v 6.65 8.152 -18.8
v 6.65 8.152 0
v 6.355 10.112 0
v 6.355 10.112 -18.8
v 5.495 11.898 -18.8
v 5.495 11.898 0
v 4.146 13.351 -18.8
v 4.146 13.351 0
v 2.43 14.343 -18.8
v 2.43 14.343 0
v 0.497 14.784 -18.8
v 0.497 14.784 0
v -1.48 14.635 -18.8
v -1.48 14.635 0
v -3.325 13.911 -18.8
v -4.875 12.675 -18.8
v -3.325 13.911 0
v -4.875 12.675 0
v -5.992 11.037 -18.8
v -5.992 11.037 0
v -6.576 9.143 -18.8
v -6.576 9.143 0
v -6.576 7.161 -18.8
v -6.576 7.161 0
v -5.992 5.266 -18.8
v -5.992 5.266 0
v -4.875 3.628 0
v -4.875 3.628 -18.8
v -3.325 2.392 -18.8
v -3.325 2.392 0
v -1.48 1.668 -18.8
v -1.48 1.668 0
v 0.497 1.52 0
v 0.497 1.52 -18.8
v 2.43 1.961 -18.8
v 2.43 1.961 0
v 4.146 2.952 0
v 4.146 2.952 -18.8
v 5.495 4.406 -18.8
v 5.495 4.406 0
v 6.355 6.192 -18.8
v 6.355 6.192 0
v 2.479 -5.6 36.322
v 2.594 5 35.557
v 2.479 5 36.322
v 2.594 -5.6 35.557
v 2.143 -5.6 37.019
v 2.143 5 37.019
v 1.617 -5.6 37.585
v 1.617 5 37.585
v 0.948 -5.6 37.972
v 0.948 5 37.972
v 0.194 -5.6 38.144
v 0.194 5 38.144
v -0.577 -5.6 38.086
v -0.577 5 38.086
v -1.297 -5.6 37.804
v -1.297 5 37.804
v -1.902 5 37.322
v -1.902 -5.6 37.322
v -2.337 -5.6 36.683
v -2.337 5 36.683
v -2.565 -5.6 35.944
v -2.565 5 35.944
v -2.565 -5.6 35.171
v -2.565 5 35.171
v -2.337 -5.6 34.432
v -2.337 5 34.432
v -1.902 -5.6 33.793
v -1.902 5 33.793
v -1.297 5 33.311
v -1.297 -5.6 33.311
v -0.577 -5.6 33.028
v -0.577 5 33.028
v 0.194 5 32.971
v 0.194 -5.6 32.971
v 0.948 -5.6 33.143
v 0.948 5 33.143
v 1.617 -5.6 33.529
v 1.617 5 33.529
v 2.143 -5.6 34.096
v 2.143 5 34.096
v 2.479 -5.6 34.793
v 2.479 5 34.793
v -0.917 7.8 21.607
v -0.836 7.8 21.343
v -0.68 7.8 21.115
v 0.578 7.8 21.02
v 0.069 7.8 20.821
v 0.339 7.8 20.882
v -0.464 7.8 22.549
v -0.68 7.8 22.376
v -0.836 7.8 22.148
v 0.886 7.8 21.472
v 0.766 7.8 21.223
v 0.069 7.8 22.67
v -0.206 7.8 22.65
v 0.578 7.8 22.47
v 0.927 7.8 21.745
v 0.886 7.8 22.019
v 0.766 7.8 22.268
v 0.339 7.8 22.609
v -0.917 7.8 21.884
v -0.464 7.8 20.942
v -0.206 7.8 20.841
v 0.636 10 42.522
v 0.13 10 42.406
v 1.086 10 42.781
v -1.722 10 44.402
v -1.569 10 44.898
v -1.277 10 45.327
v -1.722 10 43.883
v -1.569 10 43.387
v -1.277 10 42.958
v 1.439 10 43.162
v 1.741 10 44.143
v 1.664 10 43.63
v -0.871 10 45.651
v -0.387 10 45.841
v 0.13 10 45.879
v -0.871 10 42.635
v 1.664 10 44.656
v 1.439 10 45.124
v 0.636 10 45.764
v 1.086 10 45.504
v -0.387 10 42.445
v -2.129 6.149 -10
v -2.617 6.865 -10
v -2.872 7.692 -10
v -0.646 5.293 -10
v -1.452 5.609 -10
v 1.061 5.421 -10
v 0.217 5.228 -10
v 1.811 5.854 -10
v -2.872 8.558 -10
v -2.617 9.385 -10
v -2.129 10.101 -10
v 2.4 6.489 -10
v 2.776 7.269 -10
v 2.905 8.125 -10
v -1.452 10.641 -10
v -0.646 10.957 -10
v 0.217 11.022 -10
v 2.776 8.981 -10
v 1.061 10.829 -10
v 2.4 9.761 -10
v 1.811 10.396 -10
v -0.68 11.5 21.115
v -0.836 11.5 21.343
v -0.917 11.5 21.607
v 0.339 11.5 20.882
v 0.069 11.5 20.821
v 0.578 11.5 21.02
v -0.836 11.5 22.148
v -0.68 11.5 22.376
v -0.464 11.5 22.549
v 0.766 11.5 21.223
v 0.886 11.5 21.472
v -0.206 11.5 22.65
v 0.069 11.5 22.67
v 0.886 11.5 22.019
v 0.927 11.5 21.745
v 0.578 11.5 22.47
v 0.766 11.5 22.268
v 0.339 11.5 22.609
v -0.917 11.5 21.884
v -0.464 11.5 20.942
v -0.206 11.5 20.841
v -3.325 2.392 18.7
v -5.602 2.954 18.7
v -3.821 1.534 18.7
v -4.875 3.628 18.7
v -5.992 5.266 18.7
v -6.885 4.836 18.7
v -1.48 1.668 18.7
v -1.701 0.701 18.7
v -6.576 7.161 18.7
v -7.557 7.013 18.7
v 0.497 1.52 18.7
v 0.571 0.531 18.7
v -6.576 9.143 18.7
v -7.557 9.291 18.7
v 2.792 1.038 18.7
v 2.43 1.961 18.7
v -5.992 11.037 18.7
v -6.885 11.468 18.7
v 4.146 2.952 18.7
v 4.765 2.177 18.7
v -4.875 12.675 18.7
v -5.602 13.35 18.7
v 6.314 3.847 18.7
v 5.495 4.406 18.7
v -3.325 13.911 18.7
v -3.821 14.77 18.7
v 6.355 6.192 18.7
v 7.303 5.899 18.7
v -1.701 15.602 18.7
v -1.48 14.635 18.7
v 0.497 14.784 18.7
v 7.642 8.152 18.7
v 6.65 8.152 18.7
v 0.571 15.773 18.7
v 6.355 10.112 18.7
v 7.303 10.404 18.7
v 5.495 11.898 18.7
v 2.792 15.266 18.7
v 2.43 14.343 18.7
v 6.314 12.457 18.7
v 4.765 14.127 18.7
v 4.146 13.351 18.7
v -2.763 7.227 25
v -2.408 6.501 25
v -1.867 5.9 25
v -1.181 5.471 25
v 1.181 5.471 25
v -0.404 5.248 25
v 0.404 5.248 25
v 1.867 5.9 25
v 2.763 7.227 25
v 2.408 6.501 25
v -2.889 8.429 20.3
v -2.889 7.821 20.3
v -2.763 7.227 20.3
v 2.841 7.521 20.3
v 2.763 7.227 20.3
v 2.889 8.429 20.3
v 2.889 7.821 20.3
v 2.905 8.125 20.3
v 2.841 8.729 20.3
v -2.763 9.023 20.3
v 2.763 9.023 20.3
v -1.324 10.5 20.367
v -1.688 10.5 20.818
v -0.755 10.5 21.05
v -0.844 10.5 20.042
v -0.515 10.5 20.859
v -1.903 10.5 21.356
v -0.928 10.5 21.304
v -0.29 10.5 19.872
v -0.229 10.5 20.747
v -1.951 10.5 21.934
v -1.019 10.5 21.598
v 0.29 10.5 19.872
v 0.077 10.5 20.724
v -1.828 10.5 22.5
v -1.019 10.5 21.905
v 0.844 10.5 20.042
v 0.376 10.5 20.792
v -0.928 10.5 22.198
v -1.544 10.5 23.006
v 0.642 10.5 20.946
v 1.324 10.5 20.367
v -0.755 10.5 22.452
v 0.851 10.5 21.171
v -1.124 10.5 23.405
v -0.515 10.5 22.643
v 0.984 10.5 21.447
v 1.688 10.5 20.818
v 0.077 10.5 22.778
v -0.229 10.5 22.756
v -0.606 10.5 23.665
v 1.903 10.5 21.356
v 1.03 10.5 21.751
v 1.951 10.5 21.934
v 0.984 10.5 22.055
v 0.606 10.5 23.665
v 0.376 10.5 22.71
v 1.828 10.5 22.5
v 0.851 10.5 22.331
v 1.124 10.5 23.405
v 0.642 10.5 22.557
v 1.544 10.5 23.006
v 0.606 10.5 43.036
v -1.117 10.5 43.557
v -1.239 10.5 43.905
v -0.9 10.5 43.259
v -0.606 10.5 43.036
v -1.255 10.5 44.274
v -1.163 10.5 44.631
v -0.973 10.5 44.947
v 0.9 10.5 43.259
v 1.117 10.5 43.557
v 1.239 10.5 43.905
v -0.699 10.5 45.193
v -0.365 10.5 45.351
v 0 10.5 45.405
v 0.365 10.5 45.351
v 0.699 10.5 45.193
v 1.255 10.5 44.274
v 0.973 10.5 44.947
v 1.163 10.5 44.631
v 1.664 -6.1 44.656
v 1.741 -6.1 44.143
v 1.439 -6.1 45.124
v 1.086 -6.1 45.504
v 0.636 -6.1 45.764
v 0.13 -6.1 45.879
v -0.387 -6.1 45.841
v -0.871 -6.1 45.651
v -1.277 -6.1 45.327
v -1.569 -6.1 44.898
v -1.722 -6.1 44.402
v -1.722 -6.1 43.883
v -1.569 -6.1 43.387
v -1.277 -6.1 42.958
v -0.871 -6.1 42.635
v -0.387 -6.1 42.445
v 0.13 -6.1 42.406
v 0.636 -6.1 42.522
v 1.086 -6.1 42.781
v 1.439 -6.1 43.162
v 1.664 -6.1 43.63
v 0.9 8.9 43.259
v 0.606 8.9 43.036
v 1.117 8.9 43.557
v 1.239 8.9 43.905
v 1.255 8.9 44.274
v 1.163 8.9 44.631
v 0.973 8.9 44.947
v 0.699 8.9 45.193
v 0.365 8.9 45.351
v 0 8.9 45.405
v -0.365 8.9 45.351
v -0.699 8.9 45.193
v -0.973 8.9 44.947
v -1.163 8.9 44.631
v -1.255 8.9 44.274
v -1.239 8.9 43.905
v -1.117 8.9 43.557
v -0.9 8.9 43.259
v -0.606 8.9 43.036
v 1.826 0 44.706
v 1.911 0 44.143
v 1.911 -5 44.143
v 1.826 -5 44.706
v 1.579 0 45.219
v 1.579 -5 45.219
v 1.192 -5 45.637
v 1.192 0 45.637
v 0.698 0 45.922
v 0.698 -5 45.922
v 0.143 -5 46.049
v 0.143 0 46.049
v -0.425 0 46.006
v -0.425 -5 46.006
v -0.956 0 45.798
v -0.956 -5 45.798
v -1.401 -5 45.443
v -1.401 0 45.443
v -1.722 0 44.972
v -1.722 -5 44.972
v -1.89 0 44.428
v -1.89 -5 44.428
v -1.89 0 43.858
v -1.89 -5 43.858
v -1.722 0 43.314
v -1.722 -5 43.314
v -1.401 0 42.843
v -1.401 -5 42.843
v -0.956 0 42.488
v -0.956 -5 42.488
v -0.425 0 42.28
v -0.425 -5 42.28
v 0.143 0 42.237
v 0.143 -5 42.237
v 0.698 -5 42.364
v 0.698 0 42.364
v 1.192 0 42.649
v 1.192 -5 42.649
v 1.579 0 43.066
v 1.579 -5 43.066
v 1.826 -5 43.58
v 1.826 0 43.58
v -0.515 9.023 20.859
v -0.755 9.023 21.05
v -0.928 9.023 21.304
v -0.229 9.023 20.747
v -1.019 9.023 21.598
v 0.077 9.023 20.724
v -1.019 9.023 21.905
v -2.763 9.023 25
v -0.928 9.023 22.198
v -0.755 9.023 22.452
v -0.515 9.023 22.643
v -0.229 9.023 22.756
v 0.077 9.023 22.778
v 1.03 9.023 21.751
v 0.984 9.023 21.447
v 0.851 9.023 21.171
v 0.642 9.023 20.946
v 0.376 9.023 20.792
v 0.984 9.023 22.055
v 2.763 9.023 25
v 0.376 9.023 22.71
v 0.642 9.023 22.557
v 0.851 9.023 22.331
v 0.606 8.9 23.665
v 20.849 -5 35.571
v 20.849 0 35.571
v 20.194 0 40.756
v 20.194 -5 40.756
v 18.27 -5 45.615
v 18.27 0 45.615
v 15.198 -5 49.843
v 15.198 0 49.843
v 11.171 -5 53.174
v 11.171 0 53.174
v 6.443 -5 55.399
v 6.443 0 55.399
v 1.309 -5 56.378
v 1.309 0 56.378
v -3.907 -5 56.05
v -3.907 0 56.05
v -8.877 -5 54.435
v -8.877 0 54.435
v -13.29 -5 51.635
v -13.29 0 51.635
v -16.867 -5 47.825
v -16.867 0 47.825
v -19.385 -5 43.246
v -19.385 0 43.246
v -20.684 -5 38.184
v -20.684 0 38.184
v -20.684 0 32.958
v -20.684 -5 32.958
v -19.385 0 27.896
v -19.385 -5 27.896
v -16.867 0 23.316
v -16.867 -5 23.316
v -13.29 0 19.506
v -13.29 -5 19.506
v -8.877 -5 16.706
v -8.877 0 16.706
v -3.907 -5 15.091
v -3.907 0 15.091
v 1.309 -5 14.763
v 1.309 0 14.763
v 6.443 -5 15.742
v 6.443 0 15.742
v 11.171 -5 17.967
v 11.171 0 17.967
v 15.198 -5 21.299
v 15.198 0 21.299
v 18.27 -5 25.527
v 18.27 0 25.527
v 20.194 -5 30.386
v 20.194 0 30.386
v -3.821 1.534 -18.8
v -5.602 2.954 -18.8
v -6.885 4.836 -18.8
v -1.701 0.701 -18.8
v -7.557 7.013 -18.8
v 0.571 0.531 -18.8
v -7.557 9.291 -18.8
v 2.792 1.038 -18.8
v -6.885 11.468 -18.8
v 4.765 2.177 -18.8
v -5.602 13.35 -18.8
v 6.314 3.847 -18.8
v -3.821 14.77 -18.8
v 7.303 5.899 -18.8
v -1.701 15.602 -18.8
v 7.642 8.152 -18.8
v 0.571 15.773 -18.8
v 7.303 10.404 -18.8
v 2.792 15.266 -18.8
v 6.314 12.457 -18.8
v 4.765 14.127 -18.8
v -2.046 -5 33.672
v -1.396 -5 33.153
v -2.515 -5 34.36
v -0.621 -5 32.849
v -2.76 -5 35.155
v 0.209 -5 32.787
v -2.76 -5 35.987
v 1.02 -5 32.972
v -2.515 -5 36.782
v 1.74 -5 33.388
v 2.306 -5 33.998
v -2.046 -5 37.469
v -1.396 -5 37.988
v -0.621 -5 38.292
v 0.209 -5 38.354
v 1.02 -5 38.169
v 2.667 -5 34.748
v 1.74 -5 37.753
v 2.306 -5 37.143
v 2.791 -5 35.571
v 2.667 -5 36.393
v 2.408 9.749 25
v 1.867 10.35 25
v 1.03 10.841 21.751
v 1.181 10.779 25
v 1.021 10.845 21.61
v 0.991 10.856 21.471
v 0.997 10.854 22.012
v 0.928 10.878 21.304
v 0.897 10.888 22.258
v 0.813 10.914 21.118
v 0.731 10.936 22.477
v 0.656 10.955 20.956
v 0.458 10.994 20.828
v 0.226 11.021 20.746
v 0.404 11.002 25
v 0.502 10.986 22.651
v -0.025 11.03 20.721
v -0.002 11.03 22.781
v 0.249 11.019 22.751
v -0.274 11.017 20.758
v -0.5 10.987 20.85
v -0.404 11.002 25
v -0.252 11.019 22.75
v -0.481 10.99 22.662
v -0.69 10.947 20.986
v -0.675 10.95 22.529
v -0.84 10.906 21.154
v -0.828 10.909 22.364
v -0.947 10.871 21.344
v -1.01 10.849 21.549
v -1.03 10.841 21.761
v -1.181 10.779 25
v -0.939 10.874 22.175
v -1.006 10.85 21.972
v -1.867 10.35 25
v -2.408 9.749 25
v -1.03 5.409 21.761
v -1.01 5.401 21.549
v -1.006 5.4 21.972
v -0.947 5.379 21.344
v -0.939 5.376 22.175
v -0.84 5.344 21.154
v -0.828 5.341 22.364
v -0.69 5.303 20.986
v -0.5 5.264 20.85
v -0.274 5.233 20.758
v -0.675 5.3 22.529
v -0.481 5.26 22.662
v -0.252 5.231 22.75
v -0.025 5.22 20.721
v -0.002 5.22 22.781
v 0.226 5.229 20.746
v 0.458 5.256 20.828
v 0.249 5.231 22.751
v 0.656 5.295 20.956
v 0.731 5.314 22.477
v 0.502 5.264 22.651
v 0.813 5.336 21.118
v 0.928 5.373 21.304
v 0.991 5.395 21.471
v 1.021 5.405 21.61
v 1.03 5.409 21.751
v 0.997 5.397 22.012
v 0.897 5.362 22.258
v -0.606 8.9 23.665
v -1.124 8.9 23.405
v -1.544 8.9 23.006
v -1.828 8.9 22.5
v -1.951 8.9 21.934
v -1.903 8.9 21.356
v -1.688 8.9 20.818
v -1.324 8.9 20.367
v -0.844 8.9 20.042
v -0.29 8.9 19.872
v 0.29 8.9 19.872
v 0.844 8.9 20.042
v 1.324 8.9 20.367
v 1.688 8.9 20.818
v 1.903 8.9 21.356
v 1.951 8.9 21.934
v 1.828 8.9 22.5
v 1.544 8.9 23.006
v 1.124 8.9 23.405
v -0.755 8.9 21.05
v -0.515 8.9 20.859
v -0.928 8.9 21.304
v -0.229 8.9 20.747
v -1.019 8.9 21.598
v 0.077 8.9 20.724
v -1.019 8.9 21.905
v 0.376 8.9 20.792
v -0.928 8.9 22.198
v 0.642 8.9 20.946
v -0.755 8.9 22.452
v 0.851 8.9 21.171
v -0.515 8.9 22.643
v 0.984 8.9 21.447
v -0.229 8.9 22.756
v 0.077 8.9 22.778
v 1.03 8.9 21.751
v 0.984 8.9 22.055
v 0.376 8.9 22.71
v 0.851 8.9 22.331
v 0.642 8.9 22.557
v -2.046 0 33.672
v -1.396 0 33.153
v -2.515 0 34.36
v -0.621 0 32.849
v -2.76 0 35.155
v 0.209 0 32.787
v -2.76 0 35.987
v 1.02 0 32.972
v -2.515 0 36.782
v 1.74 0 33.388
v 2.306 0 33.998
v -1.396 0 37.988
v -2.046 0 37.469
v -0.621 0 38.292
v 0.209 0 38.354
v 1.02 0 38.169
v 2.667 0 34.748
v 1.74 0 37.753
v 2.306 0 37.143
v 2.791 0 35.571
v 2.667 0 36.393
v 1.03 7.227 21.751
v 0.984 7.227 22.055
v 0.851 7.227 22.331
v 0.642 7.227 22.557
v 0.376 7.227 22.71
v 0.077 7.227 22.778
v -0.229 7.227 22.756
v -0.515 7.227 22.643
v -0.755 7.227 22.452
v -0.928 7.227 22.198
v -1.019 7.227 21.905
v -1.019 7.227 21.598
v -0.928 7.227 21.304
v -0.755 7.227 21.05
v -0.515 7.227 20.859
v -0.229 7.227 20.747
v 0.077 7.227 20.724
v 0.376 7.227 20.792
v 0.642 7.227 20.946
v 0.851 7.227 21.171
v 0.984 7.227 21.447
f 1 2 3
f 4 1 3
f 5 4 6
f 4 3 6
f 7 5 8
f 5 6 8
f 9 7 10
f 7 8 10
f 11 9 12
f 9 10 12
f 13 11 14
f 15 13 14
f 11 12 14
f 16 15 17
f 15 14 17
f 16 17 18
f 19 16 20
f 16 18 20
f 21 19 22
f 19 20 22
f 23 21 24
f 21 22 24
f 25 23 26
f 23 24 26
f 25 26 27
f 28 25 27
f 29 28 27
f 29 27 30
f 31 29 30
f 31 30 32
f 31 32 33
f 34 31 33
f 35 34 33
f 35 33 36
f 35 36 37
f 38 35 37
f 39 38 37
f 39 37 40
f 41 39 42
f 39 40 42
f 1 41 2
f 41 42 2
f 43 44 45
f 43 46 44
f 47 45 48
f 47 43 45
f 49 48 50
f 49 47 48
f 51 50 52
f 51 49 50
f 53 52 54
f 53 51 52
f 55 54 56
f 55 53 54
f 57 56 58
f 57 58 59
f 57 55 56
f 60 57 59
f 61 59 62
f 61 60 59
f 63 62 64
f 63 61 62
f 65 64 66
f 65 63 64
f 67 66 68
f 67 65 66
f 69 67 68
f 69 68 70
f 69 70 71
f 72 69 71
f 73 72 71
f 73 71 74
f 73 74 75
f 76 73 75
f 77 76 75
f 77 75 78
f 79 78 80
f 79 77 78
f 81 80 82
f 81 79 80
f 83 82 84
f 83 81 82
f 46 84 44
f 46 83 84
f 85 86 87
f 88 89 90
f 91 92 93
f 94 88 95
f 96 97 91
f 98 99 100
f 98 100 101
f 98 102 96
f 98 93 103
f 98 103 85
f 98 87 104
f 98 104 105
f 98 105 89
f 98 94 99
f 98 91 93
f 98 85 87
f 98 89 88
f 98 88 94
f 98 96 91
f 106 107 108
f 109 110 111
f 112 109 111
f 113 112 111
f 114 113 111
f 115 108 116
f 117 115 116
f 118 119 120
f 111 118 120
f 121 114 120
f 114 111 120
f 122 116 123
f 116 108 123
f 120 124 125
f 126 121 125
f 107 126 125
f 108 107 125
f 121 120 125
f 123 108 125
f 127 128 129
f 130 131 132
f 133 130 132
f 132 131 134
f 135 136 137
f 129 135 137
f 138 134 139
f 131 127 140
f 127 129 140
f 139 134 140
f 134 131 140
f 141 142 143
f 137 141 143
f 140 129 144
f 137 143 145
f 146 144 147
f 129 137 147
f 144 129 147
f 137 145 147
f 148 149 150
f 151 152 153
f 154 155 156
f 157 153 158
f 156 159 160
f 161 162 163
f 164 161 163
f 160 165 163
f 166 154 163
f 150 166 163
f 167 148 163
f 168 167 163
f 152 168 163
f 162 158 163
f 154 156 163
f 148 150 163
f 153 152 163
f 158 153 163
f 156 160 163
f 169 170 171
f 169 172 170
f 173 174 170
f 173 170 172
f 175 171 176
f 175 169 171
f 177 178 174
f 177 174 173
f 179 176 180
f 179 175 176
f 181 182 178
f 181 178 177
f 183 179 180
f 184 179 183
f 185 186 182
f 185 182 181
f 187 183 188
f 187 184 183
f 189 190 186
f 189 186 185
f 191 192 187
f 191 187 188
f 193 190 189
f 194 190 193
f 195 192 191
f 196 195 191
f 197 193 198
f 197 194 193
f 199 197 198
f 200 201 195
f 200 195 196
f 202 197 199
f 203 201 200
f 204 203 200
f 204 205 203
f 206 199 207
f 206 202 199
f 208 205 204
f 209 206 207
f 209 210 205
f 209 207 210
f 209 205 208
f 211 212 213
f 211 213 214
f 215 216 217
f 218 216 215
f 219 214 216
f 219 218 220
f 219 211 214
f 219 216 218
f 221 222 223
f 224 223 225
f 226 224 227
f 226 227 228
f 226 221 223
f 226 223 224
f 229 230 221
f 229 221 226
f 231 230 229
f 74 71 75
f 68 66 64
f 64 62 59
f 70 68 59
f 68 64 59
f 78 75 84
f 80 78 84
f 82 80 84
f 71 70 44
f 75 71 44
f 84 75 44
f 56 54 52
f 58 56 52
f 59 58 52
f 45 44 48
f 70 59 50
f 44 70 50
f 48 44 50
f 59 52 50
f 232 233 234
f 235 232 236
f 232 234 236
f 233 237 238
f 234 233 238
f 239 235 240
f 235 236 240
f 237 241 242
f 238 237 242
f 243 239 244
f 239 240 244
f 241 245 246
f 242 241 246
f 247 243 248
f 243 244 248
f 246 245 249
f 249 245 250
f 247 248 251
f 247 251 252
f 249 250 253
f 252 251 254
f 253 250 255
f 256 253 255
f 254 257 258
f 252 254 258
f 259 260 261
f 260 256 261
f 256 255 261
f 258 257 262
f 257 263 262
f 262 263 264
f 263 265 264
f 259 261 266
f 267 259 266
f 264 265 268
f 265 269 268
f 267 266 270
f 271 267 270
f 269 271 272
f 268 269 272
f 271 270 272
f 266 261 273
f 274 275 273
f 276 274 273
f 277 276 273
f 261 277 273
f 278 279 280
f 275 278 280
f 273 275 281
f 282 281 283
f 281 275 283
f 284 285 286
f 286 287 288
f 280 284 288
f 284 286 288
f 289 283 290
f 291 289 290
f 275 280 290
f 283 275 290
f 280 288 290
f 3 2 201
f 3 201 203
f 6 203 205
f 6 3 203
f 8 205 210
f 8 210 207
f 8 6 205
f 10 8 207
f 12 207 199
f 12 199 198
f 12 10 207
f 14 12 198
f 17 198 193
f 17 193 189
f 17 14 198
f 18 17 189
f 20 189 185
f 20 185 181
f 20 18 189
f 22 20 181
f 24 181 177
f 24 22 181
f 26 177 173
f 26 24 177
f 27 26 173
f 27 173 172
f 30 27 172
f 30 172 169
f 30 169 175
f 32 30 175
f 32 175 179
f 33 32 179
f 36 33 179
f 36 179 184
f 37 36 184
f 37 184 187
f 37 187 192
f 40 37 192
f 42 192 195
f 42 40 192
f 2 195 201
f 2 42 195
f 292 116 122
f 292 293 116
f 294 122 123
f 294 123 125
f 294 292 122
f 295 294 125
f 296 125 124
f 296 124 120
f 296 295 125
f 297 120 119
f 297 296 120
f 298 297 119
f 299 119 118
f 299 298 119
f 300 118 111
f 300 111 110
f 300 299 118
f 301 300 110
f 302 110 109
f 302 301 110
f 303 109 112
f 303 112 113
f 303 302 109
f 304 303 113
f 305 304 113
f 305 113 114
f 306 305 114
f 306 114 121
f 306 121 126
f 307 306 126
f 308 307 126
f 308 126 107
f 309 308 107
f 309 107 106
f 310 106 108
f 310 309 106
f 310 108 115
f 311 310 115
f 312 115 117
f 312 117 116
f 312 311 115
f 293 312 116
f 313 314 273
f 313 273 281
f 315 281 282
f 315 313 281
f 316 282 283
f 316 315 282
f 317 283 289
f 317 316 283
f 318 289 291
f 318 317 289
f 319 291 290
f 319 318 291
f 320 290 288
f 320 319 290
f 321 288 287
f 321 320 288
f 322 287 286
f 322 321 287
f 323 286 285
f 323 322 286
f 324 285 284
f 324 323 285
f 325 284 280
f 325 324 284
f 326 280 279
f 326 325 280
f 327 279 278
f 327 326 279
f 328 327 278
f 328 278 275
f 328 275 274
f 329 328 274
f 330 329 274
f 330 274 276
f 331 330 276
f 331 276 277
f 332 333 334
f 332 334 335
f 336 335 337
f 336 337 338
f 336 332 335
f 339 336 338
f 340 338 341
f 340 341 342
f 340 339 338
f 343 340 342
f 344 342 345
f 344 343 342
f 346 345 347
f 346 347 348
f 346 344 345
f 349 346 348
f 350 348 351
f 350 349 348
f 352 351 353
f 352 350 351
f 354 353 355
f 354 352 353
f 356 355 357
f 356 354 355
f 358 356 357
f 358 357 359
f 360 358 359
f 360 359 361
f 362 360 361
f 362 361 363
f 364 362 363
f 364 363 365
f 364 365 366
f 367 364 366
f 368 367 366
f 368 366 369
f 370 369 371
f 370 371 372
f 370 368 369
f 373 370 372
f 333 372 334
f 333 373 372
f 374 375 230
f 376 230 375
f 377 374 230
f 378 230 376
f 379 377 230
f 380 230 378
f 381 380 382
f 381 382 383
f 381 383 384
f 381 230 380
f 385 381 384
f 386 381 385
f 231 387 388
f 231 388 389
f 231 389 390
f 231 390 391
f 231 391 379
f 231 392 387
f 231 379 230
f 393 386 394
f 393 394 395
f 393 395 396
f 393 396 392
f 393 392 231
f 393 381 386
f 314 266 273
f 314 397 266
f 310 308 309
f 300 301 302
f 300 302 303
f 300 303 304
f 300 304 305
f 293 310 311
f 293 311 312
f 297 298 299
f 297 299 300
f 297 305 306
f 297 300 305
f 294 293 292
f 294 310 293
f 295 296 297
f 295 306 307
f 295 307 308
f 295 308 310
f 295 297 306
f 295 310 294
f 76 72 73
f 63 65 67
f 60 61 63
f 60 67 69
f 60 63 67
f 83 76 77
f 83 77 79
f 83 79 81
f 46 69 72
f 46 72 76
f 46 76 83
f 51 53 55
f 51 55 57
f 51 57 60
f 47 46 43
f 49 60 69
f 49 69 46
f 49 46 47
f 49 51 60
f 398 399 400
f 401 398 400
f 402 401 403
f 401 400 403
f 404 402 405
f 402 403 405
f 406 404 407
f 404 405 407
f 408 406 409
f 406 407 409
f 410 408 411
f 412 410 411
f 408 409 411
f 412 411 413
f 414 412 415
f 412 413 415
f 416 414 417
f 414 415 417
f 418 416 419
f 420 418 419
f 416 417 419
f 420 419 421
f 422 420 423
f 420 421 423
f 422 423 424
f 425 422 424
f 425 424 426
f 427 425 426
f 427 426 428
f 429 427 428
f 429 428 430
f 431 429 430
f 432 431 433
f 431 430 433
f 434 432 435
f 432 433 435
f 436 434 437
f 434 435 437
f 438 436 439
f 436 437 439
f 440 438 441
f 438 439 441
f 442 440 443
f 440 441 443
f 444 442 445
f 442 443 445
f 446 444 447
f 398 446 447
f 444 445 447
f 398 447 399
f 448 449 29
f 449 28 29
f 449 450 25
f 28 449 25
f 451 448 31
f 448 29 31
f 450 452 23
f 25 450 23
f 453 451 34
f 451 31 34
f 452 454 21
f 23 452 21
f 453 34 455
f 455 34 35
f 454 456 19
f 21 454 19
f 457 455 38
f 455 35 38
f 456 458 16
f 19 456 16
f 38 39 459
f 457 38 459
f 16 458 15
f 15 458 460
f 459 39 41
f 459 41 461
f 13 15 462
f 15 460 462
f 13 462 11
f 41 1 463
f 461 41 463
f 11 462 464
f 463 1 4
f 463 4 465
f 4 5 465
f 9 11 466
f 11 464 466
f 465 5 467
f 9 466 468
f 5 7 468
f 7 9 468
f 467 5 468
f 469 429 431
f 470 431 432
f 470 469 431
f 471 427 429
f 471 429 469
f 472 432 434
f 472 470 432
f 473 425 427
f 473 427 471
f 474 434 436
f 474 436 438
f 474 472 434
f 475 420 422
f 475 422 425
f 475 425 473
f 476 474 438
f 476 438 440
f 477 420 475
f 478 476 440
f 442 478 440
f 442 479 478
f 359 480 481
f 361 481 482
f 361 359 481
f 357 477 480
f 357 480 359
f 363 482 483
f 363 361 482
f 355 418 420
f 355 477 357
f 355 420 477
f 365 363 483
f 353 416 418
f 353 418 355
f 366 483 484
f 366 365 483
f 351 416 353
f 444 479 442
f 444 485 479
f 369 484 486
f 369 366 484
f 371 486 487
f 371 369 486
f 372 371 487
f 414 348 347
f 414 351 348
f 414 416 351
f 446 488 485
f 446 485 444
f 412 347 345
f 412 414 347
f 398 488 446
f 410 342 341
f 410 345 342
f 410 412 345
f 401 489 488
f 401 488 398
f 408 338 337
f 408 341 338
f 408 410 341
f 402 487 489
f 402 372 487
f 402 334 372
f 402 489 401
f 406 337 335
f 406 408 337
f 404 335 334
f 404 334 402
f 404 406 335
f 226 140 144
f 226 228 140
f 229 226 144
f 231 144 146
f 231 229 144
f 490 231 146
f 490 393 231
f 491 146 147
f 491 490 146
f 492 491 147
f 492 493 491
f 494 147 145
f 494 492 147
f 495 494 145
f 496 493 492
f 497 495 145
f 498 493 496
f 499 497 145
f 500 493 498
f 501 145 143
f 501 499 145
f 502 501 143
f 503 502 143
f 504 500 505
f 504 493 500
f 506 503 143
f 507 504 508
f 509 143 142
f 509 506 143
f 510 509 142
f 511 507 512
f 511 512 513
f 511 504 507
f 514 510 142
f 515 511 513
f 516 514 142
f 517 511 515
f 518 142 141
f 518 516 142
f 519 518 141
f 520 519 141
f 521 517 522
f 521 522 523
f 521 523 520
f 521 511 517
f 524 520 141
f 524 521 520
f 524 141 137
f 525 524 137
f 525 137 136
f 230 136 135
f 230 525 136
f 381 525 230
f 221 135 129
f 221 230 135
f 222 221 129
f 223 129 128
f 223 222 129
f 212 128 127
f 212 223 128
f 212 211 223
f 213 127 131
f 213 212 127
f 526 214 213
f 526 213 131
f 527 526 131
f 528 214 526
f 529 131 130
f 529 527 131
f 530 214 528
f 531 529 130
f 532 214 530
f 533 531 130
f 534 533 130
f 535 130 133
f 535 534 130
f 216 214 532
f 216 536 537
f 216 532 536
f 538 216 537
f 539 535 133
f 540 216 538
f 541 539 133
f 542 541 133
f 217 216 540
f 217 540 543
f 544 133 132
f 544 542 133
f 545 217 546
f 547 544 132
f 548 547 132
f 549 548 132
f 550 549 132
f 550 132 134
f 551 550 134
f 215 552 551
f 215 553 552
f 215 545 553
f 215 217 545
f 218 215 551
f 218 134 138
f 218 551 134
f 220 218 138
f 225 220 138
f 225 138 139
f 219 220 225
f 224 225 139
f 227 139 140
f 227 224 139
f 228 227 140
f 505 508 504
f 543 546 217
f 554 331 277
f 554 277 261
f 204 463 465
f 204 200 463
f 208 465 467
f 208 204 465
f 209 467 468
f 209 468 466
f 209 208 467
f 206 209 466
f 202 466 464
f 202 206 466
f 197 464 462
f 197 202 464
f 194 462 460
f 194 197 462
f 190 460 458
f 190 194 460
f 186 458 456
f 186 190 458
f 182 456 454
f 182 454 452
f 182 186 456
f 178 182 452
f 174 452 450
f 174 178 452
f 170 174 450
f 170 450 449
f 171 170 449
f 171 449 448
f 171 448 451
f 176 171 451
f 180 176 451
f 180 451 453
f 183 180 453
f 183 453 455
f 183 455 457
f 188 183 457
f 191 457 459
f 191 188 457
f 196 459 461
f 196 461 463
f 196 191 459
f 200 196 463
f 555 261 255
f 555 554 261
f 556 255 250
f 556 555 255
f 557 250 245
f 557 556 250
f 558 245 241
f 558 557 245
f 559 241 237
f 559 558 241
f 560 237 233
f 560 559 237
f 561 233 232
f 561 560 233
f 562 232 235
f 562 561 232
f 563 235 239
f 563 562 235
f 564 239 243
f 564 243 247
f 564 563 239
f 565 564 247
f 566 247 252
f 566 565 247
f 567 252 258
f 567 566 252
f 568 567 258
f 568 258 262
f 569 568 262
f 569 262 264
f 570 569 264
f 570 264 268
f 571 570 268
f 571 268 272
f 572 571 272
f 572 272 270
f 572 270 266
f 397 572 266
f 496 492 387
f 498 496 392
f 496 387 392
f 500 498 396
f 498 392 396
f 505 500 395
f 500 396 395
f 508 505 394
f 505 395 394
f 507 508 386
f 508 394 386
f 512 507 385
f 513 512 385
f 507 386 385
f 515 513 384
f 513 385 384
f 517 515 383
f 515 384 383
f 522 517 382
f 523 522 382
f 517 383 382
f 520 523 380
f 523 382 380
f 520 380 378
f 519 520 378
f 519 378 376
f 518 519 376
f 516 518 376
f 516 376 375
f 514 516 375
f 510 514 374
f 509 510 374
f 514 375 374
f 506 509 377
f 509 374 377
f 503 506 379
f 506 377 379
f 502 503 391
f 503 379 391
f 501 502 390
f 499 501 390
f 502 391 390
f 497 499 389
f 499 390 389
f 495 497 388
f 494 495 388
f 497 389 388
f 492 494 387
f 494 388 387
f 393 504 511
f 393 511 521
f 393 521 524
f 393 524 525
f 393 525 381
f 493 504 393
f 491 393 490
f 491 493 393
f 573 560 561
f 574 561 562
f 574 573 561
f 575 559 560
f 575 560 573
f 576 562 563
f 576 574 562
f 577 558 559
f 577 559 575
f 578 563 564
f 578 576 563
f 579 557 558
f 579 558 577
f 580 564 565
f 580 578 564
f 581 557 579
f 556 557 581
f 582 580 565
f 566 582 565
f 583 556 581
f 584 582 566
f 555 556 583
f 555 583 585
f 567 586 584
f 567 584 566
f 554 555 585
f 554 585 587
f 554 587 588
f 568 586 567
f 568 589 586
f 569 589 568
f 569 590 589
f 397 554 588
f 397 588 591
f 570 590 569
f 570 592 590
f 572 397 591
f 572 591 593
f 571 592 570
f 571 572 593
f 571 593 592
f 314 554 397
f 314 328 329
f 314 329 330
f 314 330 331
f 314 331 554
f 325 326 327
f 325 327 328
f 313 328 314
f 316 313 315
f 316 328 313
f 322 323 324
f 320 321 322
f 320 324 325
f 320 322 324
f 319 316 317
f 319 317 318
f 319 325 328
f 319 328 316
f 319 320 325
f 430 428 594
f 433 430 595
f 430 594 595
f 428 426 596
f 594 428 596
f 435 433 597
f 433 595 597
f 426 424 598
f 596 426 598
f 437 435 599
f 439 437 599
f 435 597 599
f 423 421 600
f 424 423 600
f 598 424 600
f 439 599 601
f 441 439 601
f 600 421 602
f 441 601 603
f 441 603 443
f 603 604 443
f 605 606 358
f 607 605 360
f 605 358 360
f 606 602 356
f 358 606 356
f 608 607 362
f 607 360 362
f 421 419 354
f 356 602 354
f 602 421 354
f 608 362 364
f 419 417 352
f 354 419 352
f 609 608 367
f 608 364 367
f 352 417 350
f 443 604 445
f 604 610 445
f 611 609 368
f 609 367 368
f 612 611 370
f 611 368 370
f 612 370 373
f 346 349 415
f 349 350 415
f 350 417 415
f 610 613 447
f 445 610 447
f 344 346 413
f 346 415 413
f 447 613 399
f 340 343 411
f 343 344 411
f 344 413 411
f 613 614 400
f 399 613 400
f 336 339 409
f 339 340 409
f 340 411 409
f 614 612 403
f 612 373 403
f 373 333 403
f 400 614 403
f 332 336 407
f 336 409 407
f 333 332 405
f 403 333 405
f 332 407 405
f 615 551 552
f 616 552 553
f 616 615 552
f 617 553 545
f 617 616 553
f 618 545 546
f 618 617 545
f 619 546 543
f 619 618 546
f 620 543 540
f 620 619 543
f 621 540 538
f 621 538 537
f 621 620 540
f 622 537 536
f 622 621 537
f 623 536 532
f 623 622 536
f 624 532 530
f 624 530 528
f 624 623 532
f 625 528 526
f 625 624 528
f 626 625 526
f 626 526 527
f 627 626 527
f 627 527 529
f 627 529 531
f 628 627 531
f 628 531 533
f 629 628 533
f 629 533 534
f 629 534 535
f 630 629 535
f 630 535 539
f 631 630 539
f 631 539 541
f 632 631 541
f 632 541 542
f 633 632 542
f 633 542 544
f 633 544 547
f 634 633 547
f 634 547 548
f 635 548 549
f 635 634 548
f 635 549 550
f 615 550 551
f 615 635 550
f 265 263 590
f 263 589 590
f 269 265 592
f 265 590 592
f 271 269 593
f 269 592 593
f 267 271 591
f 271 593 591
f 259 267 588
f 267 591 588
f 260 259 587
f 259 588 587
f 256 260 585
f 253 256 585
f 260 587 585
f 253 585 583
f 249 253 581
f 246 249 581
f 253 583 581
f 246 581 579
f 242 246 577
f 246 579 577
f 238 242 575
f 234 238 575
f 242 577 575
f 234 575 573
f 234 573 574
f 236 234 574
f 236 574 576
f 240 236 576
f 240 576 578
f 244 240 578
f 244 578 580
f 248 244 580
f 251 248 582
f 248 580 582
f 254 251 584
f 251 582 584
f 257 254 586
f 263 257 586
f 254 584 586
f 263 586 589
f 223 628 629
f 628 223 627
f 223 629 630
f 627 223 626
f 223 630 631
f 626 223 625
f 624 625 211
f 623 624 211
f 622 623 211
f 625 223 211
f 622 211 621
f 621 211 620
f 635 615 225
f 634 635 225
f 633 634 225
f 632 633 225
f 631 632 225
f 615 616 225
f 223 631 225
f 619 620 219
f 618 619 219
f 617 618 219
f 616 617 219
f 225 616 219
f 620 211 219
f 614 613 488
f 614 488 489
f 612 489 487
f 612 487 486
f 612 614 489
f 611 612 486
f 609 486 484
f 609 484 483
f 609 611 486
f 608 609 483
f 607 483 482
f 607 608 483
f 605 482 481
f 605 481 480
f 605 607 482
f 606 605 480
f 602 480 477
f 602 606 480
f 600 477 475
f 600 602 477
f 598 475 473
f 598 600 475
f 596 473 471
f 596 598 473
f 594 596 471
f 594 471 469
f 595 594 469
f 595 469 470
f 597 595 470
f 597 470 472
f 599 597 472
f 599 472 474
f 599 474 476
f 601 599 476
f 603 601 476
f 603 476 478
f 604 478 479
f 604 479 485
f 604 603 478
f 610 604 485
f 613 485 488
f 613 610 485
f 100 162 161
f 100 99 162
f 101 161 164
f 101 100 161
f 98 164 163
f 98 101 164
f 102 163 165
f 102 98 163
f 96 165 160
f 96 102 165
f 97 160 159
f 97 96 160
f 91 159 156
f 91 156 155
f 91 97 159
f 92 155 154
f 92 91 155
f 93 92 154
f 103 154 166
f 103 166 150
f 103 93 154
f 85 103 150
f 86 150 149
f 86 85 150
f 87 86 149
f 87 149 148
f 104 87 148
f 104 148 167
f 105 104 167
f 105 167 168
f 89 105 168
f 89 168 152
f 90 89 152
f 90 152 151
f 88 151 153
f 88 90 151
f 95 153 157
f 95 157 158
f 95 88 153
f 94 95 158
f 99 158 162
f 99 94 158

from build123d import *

# Parameters (mm, degrees)
F0_R           = 20.8488616531
F0_R_2         = 2.7914051361
F0_R_3         = 1.9110729526
F1_DEPTH       = 5
F2_R           = 2.5940480956
F3_DEPTH       = 5.6
F3_DEPTH_BACK  = 5
F4_R           = 1.7413542599
F5_DEPTH       = 6.1
F5_DEPTH_BACK  = 10
F6_R           = 7.64207238
F6_R_2         = 6.6503709335
F7_DEPTH       = 18.7
F7_DEPTH_BACK  = 18.8
F8_R           = 2.9048803565
F9_DEPTH       = 25
F9_DEPTH_BACK  = 10
F12_DEPTH      = 0.6
F12_DEPTH_BACK = 1
F13_W          = 14.4614959136
F13_H          = 1.7955116928
F14_DEPTH      = 4.7
F15_R          = 1.0302689198
F16_DEPTH      = 7.5
F16_DEPTH_BACK = 6.8
F17_R          = 0.9273844954
F18_DEPTH      = 1.7
F18_DEPTH_BACK = 2


with BuildPart() as f1:
    # F0 (on Front) → F1 (new body)
    with BuildSketch(Plane.XZ):
        with Locations((0, 35.5707108974)):
            Circle(F0_R)
        with Locations((0, 35.5707108974)):
            Circle(F0_R_2, mode=Mode.SUBTRACT)
        with Locations((0, 44.1428981721)):
            Circle(F0_R_3, mode=Mode.SUBTRACT)
    extrude(amount=F1_DEPTH)


with BuildPart() as f3:
    # F2 (on Front) → F3 (new body, two sides)
    with BuildSketch(Plane.XZ) as f3_sk:
        with Locations((0, 35.55733338)):
            Circle(F2_R)
    extrude(amount=F3_DEPTH)
    extrude(f3_sk.sketch, amount=-F3_DEPTH_BACK)


with BuildPart() as f5:
    # F4 (on Front) → F5 (new body, two sides)
    with BuildSketch(Plane.XZ) as f5_sk:
        with Locations((0, 44.1428981721)):
            Circle(F4_R)
    extrude(amount=F5_DEPTH)
    extrude(f5_sk.sketch, amount=-F5_DEPTH_BACK)


with BuildPart() as f7:
    # F6 (on Top) → F7 (new body, two sides)
    with BuildSketch(Plane.XY) as f7_sk:
        with Locations((0, 8.151864633)):
            Circle(F6_R)
        with Locations((0, 8.151864633)):
            Circle(F6_R_2, mode=Mode.SUBTRACT)
    extrude(amount=F7_DEPTH)
    extrude(f7_sk.sketch, amount=-F7_DEPTH_BACK)


with BuildPart() as f9:
    # F8 (on Top) → F9 (new body, two sides)
    with BuildSketch(Plane.XY) as f9_sk:
        with Locations((0, 8.1250369549)):
            Circle(F8_R)
    extrude(amount=F9_DEPTH)
    extrude(f9_sk.sketch, amount=-F9_DEPTH_BACK)

    # F13 (on face) → F14 (cut)
    with BuildSketch(Plane.XY.offset(25)):
        with Locations((0, 8.1250369549)):
            Rectangle(F13_W, F13_H)
    extrude(amount=-F14_DEPTH, mode=Mode.SUBTRACT)


with BuildPart() as f12:
    # F11 (on offset) → F12 (new body, two sides)
    with BuildSketch(Plane.XZ.offset(-9.5)) as f12_sk:
        with BuildLine():
            Line((0.605799121, 23.6647080328), (0.605799121, 43.0362804415))
            ThreePointArc((0.605799121, 43.0362804415), (1.2222560307, 44.4555803897), (0, 45.4045385869))
            ThreePointArc((0, 45.4045385869), (-1.2222560307, 44.4555803897), (-0.605799121, 43.0362804415))
            Line((-0.605799121, 43.0362804415), (-0.605799121, 23.6647080328))
            ThreePointArc((-0.605799121, 23.6647080328), (0, 19.8502317187), (0.605799121, 23.6647080328))
        make_face()
    extrude(amount=F12_DEPTH)
    extrude(f12_sk.sketch, amount=-F12_DEPTH_BACK)


with BuildPart() as f16_tool:
    # F15 (on offset) → F16 (new body, two sides)
    with BuildSketch(Plane.XZ.offset(-9.5)) as f16_sk:
        with Locations((0, 21.7510685325)):
            Circle(F15_R)
    extrude(amount=-F16_DEPTH)
    extrude(f16_sk.sketch, amount=F16_DEPTH_BACK)


with BuildPart() as f9_1:
    add(f9.part)

    # F16: cut by f16_tool
    add(f16_tool.part, mode=Mode.SUBTRACT)


with BuildPart() as f12_1:
    add(f12.part)

    # F16: cut by f16_tool
    add(f16_tool.part, mode=Mode.SUBTRACT)


with BuildPart() as f18:
    # F17 (on offset) → F18 (new body, two sides)
    with BuildSketch(Plane.XZ.offset(-9.5)) as f18_sk:
        with Locations((0, 21.7454321682)):
            Circle(F17_R)
    extrude(amount=F18_DEPTH)
    extrude(f18_sk.sketch, amount=-F18_DEPTH_BACK)


solid = Compound([f1.part, f3.part, f5.part, f7.part, f9_1.part, f12_1.part, f18.part])
